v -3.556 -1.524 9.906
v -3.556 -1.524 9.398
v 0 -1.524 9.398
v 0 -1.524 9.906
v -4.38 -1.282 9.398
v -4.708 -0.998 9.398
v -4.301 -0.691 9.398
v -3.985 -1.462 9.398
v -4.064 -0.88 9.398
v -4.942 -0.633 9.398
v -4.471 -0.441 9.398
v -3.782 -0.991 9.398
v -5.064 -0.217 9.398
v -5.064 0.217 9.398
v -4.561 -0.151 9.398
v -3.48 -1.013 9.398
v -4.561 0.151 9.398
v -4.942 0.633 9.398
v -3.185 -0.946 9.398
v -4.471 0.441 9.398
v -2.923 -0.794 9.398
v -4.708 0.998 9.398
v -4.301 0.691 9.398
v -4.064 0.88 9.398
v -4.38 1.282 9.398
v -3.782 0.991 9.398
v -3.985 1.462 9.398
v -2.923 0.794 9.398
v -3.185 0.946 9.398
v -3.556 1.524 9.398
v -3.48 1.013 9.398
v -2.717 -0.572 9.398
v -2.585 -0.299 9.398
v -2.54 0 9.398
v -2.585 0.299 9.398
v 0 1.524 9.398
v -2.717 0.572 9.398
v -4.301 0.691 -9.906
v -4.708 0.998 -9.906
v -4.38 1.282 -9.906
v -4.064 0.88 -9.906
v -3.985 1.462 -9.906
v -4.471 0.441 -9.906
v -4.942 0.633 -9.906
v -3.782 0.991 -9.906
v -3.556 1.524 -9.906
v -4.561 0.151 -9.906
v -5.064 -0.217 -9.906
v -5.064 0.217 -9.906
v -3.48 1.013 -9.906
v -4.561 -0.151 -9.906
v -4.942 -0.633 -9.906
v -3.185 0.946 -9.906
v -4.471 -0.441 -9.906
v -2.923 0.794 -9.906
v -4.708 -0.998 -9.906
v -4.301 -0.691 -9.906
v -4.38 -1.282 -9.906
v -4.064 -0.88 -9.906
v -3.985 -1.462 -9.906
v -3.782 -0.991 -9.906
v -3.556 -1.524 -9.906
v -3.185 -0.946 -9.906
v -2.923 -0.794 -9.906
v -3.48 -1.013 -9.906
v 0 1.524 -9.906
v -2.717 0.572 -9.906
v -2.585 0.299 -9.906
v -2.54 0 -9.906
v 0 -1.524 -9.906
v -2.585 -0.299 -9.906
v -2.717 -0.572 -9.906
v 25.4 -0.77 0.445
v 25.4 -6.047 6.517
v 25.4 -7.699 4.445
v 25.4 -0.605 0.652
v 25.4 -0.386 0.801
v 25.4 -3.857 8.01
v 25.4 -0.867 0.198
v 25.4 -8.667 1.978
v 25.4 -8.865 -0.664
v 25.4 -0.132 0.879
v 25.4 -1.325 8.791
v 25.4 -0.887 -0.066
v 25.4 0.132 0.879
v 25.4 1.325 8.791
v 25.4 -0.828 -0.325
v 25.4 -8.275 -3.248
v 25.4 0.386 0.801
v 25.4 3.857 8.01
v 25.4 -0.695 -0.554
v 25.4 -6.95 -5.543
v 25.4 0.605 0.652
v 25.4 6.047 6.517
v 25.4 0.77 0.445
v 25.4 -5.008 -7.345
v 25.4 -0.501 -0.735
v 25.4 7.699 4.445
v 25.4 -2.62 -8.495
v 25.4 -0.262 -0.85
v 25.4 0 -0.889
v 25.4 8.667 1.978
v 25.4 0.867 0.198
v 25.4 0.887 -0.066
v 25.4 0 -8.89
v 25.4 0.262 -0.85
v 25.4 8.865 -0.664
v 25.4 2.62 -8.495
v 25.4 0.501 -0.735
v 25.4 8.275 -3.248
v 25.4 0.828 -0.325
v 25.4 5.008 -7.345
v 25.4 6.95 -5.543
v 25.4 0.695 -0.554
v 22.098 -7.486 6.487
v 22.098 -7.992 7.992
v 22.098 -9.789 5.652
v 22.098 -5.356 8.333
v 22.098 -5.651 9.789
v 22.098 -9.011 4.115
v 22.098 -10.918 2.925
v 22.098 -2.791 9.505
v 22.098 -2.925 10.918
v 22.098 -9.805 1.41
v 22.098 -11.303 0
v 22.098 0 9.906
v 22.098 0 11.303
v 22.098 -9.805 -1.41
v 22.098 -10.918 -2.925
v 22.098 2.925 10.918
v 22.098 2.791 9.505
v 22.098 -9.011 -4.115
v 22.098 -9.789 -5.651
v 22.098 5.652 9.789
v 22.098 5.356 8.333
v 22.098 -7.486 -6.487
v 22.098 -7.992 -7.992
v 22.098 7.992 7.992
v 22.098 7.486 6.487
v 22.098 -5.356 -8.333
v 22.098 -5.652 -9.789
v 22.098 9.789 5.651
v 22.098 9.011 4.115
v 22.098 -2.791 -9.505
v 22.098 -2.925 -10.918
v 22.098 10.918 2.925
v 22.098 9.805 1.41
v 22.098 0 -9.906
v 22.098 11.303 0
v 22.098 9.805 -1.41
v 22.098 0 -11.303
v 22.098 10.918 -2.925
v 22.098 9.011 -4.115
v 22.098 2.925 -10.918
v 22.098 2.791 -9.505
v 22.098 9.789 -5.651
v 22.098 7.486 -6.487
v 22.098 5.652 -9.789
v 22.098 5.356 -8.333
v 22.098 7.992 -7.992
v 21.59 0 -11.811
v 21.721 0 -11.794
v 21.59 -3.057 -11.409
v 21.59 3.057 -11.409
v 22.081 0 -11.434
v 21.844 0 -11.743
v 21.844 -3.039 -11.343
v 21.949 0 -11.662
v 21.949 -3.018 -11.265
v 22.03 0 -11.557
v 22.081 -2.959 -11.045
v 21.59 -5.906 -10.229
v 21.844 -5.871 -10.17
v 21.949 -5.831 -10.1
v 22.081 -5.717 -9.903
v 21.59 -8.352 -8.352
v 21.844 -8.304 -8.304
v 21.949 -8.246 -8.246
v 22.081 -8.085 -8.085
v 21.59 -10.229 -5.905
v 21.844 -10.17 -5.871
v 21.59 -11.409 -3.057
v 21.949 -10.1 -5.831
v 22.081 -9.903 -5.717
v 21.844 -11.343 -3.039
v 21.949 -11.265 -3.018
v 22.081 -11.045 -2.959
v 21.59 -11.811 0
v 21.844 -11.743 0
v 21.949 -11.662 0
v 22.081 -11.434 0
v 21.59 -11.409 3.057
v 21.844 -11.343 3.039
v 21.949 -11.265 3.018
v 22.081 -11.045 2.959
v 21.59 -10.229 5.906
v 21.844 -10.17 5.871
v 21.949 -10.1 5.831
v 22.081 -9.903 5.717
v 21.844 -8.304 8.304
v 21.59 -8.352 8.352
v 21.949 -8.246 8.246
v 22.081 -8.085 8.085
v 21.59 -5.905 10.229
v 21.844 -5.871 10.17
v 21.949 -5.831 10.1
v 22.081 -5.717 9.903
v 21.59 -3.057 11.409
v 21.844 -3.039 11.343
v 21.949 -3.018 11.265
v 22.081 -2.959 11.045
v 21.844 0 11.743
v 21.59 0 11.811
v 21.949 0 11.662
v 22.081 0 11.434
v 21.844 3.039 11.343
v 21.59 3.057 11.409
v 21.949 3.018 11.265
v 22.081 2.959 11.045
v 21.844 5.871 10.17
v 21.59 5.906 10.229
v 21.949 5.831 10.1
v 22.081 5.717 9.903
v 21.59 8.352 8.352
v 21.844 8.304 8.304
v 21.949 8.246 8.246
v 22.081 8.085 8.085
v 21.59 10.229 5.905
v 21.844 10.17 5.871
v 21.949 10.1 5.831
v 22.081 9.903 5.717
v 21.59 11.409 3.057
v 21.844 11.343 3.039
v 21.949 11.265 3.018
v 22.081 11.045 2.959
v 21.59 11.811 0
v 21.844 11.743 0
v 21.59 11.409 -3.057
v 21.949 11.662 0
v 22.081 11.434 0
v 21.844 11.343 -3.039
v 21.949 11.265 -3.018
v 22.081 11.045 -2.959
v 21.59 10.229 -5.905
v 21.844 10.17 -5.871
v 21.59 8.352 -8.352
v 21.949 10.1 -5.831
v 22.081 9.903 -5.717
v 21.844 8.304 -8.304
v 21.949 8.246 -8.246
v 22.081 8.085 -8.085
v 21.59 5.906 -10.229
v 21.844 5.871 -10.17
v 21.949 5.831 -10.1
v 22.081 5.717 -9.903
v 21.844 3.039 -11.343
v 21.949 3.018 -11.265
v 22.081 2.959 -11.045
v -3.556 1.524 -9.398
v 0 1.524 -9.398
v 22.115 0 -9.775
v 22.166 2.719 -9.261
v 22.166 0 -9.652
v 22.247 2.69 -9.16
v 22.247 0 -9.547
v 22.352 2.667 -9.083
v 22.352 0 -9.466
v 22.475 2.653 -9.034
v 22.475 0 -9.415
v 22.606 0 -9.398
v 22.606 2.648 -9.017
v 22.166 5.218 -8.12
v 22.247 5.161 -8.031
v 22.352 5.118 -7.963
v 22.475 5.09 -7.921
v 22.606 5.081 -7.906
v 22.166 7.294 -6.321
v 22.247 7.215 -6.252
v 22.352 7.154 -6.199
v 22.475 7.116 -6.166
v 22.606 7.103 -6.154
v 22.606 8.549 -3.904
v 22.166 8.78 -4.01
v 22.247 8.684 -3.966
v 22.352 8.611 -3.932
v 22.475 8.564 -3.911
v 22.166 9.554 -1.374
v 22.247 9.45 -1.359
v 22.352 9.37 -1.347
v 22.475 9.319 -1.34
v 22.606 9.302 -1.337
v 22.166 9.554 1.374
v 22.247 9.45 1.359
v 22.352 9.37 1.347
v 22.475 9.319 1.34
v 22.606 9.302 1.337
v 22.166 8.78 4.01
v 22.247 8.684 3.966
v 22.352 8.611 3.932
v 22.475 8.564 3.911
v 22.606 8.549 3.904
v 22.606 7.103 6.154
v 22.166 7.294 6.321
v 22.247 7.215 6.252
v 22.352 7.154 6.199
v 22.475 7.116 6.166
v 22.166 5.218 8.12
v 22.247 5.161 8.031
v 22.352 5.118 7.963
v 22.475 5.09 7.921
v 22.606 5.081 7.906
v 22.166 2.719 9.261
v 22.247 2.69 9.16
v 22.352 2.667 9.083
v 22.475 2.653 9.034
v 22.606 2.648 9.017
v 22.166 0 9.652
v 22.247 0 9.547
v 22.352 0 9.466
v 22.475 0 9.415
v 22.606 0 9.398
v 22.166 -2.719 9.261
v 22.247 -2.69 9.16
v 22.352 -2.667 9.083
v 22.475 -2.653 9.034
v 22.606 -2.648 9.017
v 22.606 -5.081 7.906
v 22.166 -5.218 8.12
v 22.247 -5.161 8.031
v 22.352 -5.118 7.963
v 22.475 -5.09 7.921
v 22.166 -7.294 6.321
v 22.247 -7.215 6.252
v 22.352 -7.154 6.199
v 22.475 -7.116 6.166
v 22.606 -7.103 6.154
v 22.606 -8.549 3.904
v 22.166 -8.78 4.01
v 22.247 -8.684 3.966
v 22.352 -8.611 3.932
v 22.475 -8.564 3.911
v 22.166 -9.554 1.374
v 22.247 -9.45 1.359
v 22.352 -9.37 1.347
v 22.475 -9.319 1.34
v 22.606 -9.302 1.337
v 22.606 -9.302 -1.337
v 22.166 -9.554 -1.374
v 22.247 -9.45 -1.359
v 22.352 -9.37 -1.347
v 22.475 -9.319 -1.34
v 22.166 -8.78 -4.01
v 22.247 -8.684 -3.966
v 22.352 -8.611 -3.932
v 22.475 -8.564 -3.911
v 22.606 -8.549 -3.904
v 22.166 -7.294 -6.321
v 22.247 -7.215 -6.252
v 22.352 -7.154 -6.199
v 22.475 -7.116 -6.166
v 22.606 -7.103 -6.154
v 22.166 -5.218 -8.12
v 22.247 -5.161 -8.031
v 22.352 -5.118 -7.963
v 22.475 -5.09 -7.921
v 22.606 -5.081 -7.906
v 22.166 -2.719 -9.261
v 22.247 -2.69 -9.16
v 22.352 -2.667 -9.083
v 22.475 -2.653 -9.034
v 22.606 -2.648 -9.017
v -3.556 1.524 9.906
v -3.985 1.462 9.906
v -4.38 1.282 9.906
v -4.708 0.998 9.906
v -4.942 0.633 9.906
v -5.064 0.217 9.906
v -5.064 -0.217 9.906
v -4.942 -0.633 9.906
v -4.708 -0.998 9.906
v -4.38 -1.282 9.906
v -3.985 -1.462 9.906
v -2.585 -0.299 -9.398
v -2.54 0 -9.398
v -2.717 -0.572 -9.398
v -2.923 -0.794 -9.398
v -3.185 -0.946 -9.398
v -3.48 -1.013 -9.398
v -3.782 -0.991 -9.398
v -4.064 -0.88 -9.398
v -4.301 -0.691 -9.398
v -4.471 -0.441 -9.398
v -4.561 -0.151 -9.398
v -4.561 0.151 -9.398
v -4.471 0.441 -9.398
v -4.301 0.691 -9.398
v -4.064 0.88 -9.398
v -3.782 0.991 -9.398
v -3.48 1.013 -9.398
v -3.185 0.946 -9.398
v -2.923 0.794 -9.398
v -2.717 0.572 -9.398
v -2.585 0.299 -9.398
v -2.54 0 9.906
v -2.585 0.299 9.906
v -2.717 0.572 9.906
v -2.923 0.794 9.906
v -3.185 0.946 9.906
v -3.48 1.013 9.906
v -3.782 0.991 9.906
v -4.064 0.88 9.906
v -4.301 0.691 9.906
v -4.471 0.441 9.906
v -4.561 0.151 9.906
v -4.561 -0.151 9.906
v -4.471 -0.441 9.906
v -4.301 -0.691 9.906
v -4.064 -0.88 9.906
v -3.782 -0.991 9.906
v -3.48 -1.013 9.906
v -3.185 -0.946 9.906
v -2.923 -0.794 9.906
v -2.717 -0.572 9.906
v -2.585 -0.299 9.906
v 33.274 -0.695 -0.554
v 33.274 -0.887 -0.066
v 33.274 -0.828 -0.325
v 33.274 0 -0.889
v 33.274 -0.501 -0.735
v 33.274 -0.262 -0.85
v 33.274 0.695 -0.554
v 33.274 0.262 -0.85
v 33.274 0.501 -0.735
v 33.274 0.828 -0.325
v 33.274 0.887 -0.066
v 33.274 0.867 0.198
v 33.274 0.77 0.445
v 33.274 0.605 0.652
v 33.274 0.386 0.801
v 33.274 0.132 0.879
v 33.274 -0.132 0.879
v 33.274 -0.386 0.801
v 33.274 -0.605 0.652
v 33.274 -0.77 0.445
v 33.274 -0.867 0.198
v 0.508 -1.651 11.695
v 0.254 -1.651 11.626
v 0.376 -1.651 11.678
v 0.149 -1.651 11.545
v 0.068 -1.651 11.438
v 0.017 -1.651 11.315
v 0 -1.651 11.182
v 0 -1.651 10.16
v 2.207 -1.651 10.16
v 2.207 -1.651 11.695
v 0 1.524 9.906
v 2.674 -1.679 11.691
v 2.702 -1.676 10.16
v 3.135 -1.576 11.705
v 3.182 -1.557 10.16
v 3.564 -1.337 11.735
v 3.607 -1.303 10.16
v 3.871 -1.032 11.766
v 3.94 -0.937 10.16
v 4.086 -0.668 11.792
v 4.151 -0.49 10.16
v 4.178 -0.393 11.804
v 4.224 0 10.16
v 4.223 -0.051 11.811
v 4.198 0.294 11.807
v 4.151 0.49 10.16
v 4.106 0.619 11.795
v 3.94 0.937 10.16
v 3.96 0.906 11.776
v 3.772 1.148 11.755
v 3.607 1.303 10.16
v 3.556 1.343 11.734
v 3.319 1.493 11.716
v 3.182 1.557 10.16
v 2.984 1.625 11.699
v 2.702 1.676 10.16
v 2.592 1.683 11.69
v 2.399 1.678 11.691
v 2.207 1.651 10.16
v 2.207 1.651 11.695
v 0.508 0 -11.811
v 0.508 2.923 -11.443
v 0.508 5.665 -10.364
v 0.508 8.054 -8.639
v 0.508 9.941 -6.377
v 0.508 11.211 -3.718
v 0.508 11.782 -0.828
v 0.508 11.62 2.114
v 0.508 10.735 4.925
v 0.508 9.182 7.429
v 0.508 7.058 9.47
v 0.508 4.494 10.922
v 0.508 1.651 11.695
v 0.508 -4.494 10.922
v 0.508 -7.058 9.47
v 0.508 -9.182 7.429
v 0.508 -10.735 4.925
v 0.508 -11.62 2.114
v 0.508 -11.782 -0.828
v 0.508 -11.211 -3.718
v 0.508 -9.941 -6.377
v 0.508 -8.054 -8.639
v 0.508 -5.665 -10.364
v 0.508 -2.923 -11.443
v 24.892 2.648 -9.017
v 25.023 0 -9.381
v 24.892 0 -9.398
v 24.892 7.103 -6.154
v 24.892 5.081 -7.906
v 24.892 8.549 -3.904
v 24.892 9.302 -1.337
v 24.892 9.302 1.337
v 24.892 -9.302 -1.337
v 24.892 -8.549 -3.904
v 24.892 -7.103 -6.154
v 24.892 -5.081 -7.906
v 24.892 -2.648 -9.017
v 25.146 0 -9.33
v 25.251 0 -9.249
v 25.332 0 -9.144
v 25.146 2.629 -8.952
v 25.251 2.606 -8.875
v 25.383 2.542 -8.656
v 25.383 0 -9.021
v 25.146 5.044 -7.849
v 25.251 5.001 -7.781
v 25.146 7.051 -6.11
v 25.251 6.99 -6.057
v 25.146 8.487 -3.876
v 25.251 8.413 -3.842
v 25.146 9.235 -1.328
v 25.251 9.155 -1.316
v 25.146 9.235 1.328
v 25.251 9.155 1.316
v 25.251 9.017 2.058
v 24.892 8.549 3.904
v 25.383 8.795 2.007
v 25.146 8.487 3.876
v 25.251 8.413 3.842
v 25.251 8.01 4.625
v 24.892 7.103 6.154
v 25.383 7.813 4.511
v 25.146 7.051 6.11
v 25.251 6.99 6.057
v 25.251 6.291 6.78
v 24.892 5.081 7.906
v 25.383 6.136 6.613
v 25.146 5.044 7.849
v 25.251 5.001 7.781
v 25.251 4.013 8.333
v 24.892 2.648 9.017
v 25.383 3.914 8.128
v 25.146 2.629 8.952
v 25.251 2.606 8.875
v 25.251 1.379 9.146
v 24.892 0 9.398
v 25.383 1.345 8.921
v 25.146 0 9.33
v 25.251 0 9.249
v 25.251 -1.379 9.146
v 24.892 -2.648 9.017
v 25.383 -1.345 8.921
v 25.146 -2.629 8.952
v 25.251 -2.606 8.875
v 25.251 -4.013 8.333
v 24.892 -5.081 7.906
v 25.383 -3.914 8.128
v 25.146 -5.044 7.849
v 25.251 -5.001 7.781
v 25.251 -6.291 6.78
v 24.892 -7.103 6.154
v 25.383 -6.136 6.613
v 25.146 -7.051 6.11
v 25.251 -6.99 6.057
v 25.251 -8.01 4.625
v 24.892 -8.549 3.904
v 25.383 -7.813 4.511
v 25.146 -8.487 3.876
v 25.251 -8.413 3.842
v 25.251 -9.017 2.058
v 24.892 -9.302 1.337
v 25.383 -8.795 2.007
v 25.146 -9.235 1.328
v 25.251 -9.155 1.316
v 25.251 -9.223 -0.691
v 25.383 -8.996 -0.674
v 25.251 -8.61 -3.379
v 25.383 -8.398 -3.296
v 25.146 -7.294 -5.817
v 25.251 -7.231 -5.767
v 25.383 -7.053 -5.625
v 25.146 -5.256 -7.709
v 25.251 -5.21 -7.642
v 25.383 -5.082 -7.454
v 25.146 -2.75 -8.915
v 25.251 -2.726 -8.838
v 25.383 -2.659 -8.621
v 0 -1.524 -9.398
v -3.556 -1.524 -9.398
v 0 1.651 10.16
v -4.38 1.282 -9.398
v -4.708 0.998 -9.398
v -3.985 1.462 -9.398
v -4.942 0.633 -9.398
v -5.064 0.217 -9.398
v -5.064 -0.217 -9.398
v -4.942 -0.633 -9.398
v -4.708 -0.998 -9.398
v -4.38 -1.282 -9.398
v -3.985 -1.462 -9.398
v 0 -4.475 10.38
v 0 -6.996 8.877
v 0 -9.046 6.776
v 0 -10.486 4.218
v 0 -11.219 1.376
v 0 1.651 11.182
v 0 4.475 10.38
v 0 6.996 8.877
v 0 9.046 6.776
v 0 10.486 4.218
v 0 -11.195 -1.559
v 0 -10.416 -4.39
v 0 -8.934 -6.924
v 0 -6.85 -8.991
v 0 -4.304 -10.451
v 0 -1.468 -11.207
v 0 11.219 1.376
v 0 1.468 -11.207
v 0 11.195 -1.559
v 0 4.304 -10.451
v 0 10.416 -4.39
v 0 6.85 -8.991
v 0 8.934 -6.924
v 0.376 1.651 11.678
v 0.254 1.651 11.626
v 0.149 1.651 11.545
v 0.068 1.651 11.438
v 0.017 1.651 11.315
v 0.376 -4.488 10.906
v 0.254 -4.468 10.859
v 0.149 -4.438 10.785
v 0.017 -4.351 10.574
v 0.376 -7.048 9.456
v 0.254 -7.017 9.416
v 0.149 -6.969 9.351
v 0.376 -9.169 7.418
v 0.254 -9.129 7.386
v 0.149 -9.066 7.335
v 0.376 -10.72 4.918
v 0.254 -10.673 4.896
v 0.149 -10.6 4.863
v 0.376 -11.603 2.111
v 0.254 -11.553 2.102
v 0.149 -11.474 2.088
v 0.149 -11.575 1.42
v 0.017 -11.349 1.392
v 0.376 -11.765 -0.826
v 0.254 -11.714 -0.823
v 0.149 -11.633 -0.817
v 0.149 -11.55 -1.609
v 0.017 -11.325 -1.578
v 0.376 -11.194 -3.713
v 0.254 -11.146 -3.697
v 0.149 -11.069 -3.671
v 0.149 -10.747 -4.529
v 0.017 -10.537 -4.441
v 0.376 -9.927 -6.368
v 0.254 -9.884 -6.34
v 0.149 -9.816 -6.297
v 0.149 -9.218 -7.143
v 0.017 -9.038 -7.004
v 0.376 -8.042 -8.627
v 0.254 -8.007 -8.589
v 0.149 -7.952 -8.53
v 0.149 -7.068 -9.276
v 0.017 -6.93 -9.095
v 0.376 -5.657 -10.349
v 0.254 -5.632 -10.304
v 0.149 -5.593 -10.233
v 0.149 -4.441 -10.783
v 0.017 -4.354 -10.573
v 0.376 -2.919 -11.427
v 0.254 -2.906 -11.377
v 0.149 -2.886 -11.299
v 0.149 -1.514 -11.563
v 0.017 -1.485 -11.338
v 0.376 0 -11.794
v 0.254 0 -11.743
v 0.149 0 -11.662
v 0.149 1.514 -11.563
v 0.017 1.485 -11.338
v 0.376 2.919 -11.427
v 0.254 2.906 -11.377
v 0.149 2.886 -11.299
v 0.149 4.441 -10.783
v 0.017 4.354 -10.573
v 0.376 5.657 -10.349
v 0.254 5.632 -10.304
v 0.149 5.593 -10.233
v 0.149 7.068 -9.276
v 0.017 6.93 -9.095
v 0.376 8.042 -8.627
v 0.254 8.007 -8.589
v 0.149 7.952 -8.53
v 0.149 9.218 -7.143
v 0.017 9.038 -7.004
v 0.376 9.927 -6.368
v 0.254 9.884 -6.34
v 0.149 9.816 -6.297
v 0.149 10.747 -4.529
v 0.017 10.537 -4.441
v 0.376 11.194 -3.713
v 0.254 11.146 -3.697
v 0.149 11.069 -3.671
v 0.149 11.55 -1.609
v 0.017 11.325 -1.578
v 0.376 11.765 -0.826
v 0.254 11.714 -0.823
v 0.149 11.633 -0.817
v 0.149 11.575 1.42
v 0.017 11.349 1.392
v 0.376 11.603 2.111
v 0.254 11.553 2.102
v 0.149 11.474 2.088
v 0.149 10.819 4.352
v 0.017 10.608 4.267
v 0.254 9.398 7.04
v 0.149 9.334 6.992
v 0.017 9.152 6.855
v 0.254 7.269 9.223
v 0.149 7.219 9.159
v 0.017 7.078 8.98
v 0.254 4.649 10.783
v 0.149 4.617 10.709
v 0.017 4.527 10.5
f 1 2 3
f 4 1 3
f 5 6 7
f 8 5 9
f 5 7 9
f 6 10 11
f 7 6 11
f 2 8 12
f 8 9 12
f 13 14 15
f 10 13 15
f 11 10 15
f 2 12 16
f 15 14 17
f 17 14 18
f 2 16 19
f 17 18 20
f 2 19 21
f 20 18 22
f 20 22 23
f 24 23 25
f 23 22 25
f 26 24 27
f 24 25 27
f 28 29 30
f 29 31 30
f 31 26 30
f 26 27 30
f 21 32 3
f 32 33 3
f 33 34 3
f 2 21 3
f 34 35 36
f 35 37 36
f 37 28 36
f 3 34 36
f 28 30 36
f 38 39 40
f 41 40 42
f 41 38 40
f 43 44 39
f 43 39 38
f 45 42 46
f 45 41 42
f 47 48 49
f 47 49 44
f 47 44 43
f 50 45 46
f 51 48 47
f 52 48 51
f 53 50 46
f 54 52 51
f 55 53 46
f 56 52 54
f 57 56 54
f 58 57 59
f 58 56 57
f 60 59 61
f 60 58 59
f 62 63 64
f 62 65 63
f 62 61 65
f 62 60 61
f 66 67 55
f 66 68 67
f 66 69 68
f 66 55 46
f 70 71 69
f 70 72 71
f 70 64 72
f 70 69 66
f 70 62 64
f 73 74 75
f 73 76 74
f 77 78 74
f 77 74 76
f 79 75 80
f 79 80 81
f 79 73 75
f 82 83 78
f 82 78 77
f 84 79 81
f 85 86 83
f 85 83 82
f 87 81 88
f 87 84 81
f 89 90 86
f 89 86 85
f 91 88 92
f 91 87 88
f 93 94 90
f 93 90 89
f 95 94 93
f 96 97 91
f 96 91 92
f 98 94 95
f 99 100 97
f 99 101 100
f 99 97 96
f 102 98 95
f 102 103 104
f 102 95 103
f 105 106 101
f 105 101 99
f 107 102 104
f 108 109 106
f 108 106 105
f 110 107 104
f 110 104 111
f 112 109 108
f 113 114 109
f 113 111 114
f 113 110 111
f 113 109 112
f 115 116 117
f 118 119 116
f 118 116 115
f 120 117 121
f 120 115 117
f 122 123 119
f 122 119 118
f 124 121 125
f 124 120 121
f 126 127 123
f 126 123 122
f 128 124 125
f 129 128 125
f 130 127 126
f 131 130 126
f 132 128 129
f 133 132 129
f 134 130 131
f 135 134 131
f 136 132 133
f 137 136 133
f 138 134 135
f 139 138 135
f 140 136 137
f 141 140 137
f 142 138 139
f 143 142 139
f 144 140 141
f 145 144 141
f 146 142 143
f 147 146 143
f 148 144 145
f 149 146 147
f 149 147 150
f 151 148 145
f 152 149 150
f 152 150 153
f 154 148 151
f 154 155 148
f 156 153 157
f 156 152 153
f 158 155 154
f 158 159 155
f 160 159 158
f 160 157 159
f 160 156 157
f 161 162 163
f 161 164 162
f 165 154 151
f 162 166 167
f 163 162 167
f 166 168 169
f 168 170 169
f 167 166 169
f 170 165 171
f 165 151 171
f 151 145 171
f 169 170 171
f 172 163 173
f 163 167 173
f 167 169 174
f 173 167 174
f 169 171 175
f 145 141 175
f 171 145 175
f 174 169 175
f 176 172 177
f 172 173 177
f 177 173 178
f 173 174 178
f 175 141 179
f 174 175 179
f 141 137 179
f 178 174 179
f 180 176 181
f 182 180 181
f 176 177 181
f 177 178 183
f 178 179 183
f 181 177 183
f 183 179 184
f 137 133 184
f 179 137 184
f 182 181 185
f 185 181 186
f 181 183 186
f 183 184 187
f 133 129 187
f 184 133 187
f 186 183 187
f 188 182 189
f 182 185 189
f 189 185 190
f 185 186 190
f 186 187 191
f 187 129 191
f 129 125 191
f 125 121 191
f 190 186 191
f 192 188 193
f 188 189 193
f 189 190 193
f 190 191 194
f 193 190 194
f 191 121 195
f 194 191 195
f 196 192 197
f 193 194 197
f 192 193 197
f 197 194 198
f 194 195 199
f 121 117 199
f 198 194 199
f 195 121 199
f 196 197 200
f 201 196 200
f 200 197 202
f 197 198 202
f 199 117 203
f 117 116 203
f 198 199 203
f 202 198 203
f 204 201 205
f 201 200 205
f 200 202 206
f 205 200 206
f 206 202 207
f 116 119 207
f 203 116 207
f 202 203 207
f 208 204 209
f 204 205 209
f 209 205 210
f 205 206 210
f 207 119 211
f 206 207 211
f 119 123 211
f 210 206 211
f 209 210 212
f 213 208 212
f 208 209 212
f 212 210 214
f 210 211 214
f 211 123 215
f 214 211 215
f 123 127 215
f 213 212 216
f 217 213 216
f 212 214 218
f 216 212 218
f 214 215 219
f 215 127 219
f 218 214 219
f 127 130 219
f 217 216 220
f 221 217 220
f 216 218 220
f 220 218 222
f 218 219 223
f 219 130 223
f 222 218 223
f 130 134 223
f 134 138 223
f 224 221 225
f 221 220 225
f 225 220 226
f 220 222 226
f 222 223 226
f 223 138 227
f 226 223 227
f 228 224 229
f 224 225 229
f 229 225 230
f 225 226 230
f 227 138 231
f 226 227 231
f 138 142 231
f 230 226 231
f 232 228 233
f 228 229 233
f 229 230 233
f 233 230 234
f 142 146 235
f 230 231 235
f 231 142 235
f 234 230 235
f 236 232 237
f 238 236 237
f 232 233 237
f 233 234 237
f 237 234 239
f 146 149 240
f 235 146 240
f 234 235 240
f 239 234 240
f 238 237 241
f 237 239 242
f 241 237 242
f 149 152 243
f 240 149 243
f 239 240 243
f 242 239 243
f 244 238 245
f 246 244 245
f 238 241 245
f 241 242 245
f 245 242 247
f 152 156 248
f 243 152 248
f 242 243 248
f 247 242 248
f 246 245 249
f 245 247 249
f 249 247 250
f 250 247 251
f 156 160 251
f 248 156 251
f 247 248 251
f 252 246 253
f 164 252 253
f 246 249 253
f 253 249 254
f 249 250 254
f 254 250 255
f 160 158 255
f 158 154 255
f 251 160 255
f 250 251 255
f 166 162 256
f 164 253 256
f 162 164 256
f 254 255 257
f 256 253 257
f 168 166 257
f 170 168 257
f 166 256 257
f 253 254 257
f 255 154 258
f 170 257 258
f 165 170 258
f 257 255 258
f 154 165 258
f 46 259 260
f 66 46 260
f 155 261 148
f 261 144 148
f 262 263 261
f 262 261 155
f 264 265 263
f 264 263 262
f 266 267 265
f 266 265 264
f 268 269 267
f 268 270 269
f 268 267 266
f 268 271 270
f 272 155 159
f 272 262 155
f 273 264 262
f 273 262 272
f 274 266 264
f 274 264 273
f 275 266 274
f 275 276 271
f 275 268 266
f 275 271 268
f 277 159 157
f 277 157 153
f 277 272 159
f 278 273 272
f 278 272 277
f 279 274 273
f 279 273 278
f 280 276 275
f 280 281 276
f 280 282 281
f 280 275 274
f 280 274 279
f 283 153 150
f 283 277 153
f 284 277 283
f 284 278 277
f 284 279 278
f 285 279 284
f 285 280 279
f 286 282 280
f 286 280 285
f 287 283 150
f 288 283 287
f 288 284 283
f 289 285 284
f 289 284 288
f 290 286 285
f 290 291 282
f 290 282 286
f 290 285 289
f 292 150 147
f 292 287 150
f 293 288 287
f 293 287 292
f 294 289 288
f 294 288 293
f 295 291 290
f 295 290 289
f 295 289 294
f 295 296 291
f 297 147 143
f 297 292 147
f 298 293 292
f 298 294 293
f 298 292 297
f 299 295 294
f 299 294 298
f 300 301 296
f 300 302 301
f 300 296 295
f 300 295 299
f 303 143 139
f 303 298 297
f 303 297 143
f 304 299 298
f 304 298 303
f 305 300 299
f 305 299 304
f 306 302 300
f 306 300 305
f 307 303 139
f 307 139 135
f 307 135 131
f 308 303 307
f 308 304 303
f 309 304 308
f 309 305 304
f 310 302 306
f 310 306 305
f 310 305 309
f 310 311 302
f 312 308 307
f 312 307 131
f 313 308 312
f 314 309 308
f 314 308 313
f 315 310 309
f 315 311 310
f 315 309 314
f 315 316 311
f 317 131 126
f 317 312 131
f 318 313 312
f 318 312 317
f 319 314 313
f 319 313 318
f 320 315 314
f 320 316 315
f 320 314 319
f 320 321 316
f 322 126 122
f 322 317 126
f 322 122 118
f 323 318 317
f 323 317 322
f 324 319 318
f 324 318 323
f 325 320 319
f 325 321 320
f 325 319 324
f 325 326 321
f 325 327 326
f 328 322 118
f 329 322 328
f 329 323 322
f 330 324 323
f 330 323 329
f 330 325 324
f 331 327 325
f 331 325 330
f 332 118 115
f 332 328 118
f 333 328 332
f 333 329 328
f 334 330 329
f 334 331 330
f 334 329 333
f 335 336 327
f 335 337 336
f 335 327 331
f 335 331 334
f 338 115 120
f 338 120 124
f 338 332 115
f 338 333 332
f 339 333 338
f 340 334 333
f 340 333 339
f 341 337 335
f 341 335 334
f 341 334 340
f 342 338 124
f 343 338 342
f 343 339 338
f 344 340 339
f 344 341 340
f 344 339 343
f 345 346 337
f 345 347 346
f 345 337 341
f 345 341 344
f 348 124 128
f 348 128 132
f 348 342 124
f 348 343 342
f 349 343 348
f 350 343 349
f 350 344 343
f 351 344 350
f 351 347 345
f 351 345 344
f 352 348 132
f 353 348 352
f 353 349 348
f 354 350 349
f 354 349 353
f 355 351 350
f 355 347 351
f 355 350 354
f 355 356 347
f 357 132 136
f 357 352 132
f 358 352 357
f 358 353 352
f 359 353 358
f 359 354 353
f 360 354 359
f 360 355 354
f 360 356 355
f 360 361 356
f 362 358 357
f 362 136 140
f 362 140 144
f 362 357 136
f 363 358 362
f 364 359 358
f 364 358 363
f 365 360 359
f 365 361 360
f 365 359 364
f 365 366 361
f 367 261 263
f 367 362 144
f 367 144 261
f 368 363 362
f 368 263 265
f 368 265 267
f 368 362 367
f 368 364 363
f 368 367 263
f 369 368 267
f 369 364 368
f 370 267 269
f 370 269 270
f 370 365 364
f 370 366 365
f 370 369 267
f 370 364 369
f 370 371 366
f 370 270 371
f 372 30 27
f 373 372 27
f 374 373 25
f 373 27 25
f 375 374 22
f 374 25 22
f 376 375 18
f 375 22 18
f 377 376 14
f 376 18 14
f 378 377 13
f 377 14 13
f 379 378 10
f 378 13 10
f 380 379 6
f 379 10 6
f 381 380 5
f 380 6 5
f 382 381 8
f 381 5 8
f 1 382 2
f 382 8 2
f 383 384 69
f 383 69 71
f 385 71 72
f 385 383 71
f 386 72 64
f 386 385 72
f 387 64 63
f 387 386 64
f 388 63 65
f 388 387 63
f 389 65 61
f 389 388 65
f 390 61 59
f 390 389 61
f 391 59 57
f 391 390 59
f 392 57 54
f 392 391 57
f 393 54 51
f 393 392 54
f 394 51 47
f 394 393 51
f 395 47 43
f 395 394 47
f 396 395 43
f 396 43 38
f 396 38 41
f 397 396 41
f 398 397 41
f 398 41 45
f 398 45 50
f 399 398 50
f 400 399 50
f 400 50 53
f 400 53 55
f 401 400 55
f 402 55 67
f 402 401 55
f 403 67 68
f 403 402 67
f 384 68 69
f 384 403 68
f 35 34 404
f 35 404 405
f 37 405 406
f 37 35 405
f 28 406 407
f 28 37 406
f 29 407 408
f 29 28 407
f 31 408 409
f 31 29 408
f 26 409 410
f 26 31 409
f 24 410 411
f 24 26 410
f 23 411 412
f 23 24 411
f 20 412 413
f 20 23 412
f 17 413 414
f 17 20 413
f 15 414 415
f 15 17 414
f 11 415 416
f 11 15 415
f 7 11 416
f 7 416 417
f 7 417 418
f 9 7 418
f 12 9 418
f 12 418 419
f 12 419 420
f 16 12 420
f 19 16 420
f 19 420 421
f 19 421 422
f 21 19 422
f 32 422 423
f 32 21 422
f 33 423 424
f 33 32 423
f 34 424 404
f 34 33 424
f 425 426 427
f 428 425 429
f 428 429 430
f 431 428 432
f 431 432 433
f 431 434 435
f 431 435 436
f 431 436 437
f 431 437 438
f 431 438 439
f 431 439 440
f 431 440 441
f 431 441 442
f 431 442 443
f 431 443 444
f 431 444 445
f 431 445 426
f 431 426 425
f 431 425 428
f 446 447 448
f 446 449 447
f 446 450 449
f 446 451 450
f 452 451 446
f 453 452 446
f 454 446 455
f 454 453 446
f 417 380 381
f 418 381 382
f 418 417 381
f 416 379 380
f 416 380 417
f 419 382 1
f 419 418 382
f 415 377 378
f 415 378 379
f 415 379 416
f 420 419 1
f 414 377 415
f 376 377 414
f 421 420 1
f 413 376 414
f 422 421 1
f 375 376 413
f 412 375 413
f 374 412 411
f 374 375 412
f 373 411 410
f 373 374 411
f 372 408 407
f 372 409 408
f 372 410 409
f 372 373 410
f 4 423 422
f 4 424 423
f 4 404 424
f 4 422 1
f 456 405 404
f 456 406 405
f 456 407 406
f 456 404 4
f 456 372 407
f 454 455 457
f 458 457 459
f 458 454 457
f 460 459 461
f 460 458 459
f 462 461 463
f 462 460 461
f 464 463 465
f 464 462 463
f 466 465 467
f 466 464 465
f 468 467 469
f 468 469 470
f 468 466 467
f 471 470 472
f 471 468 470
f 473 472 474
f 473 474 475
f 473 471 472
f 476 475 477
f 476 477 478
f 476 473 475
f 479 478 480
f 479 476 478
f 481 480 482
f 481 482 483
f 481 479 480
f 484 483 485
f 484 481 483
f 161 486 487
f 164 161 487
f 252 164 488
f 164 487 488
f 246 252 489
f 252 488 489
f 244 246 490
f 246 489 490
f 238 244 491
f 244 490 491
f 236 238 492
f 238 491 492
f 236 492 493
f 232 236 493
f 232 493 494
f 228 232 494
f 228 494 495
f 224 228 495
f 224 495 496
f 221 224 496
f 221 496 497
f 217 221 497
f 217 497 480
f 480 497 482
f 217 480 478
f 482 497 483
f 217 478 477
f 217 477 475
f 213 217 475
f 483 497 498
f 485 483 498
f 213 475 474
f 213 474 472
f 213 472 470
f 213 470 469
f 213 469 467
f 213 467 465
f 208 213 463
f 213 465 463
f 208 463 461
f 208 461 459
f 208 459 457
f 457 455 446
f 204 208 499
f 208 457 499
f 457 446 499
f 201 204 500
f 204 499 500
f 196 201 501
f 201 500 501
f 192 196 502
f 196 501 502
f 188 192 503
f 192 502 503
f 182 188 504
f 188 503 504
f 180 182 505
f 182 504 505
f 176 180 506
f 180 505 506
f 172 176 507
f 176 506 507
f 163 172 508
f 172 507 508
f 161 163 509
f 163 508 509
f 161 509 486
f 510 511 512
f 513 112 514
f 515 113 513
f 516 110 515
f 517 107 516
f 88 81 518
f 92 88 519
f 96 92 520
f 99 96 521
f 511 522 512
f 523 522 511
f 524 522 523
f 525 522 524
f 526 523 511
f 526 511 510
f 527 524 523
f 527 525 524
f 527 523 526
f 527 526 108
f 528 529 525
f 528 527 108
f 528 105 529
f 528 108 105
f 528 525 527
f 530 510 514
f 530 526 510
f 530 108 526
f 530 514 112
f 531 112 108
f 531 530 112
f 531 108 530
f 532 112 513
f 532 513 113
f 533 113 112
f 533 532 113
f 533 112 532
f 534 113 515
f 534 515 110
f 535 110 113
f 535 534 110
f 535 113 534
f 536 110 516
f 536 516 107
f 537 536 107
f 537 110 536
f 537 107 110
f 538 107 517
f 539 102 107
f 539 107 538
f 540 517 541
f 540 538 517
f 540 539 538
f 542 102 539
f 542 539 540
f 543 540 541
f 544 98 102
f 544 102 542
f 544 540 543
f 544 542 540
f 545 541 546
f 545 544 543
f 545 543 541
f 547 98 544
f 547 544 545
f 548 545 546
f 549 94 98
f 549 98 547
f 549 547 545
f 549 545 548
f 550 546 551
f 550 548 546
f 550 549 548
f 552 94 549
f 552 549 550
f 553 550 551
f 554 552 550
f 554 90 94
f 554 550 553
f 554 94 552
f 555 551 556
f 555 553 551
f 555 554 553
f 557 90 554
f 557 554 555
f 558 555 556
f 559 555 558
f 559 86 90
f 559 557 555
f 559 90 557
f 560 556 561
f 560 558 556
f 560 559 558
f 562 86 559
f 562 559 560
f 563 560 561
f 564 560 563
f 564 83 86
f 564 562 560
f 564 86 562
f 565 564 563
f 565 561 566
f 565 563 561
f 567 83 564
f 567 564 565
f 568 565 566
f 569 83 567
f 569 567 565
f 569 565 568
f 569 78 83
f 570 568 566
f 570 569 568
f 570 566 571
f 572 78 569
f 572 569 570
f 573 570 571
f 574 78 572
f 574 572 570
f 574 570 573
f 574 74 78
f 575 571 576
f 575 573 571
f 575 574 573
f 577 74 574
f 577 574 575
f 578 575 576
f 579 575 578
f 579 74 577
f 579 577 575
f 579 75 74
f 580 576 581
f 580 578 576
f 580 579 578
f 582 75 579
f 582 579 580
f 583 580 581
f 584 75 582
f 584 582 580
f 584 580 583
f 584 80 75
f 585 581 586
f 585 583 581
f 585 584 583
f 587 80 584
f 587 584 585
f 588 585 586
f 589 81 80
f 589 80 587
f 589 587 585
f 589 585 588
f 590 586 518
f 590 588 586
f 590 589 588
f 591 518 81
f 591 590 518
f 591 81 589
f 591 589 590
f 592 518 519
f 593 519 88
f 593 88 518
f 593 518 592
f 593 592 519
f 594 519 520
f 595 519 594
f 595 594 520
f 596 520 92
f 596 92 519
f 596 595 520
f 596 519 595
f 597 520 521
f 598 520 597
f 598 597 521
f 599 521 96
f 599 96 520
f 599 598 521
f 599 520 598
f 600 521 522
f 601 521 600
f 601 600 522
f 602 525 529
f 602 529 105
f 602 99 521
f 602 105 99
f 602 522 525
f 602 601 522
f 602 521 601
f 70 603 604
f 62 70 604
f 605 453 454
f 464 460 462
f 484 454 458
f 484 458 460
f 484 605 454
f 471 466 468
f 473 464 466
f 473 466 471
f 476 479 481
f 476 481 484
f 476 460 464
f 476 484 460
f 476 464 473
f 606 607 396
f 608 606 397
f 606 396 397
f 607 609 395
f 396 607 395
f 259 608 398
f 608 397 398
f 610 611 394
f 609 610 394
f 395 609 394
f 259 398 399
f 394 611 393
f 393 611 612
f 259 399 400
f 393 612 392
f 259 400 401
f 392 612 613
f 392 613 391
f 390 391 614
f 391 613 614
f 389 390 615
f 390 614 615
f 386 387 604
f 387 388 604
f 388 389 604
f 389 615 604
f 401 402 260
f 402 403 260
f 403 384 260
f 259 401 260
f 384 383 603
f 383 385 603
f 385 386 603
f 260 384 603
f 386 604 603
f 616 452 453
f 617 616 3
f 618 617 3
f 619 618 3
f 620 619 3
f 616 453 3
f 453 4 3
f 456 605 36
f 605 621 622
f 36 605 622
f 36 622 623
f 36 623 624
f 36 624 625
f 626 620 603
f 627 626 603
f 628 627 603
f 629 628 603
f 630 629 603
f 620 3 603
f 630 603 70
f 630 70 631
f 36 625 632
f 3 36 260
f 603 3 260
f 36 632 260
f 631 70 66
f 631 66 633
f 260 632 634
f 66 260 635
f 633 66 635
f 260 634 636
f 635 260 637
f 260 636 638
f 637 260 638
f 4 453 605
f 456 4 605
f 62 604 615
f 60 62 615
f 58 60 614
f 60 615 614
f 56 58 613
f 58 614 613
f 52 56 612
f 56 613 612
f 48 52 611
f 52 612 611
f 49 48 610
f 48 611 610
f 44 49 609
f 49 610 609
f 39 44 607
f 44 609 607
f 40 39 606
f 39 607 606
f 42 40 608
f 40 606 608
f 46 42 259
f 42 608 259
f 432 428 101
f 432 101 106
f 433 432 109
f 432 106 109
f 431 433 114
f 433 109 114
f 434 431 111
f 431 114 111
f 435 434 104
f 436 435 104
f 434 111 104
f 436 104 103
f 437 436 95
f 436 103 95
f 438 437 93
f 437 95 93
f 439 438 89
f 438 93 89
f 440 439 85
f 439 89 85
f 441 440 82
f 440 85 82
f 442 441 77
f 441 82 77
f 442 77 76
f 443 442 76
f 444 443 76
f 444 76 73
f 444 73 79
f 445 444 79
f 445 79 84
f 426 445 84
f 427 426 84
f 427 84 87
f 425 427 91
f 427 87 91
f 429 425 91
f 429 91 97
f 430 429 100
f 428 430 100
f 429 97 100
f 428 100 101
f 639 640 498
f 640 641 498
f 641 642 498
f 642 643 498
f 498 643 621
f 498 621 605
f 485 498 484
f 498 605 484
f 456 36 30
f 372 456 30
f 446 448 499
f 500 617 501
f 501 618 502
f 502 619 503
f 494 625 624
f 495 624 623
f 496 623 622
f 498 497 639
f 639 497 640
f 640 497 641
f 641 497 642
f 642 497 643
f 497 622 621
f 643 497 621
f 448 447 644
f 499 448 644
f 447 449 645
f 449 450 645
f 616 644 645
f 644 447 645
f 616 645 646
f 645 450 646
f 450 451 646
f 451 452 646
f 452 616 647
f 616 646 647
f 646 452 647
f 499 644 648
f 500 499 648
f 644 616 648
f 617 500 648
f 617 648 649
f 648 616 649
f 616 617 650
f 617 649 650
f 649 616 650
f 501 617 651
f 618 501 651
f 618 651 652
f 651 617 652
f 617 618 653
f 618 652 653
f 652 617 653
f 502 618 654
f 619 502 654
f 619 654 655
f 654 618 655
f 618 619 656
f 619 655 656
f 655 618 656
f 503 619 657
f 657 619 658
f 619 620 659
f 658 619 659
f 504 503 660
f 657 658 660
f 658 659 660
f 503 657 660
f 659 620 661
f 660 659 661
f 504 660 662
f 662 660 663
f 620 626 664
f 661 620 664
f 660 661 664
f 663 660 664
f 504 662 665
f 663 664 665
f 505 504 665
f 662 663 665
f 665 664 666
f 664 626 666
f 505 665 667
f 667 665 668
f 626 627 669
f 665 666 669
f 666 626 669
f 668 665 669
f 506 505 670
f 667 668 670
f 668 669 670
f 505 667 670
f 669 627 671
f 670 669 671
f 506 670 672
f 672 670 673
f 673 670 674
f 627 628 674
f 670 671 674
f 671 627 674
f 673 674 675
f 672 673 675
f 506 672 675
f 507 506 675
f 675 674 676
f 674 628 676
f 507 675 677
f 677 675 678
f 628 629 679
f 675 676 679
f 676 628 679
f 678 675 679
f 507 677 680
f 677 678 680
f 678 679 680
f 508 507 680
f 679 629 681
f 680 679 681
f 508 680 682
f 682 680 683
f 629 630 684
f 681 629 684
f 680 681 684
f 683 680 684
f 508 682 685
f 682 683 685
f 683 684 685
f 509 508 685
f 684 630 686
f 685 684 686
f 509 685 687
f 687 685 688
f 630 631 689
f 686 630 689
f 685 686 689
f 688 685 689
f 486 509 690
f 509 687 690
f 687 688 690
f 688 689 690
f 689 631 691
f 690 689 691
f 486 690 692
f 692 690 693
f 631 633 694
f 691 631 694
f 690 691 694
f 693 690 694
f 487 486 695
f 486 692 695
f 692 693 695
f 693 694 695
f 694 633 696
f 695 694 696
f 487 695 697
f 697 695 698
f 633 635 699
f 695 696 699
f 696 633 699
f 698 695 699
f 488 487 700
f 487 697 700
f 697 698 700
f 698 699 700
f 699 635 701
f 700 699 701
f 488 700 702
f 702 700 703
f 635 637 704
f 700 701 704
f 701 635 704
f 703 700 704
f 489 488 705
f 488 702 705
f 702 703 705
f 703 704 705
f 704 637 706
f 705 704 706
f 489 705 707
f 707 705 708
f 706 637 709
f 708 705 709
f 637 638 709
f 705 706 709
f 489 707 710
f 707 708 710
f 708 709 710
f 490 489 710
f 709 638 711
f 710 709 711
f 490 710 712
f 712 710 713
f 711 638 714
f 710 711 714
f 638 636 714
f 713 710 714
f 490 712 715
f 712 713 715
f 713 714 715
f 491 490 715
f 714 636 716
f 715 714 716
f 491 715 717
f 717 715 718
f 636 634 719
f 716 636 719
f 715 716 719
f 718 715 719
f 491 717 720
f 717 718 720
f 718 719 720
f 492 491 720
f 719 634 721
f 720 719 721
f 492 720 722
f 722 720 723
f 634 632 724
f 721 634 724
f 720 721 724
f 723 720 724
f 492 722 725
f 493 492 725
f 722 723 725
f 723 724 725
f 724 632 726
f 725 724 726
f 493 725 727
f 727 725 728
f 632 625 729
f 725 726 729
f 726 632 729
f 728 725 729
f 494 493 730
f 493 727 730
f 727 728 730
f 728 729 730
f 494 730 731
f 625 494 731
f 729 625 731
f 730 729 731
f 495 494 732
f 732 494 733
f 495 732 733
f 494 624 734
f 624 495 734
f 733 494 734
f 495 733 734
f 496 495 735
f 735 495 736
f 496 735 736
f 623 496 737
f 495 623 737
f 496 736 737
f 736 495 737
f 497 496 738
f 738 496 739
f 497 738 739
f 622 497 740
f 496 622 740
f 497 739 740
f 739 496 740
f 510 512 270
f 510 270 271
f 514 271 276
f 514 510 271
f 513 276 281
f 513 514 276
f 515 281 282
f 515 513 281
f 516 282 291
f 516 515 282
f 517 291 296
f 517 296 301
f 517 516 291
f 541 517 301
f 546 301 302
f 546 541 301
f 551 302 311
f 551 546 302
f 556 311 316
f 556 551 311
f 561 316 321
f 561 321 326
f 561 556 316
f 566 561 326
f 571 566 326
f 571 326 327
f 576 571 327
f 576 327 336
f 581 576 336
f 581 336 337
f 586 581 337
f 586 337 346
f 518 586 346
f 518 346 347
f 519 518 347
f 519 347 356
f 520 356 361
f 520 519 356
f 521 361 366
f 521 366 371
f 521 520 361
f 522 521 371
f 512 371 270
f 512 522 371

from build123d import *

# Parameters (mm, degrees)
SKETCH2_R           = 11.811
BOSS_EXTRUDE1_DEPTH = 25.4
SKETCH4_OUTSIDE_W   = 34.016
SKETCH4_OUTSIDE_H   = 34.016
SKETCH4_OUTSIDE_R   = 9.398
CUT_EXTRUDE1_DEPTH  = 3.302
FILLET1_R           = 0.508
SKETCH5_R           = 0.889
BOSS_EXTRUDE2_DEPTH = 7.874
CUT_EXTRUDE2_START  = 10.16
SKETCH8_R           = 1.684208496
SKETCH8_W           = 2.54
SKETCH8_H           = 3.302
CUT_EXTRUDE2_DEPTH  = 28.071149866
BOSS_EXTRUDE3_START = 9.398
SKETCH10_R          = 1.016
BOSS_EXTRUDE3_DEPTH = 0.508
CIRPATTERN1_COUNT   = 2


with BuildPart() as part:
    # Sketch2 → Boss-Extrude1 (new body)
    with BuildSketch(Plane(origin=(0, 0, 0), x_dir=(0, 0, -1), z_dir=(1, 0, 0))):
        Circle(SKETCH2_R)
    extrude(amount=BOSS_EXTRUDE1_DEPTH)

    # Sketch4 outside → Cut-Extrude1 (cut)
    with BuildSketch(Plane(origin=(25.4, 0, 0), x_dir=(0, 0, -1), z_dir=(1, 0, 0))):
        Rectangle(SKETCH4_OUTSIDE_W, SKETCH4_OUTSIDE_H)
        Circle(SKETCH4_OUTSIDE_R, mode=Mode.SUBTRACT)
    extrude(amount=-CUT_EXTRUDE1_DEPTH, mode=Mode.SUBTRACT)

    # Fillet1
    fillet1_edges = [part.edges().sort_by_distance(p)[0] for p in [
        (22.098, 0, 11.811),
        (25.4, 0, 9.398),
        (0, 0, 11.811),
        (22.098, 0, 9.398),
    ]]
    fillet(fillet1_edges, radius=FILLET1_R)

    # Sketch5 → Boss-Extrude2 (add)
    with BuildSketch(Plane(origin=(25.4, 0, 0), x_dir=(0, 0, -1), z_dir=(1, 0, 0))):
        Circle(SKETCH5_R)
    extrude(amount=BOSS_EXTRUDE2_DEPTH)

    # Sketch8 → Cut-Extrude2 (cut, through all)
    with BuildSketch(Plane.XY.offset(CUT_EXTRUDE2_START)):
        with Locations((2.54, 0)):
            Circle(SKETCH8_R)
        with Locations((1.27, 0)):
            Rectangle(SKETCH8_W, SKETCH8_H)
    extrude(amount=CUT_EXTRUDE2_DEPTH, mode=Mode.SUBTRACT)

    # Sketch10 → Boss-Extrude3 (add)
    with BuildSketch(Plane.XY.offset(BOSS_EXTRUDE3_START)):
        with BuildLine():
            Line((-3.556, -1.524), (0, -1.524))
            Line((0, -1.524), (0, 1.524))
            Line((0, 1.524), (-3.556, 1.524))
            ThreePointArc((-3.556, 1.524), (-5.08, 0), (-3.556, -1.524))
        make_face()
        with Locations((-3.556, 0)):
            Circle(SKETCH10_R, mode=Mode.SUBTRACT)
    boss_extrude3 = extrude(amount=BOSS_EXTRUDE3_DEPTH)

    # CirPattern1: Boss-Extrude3 ×2 about axis
    cirpattern1_axis = Axis((0, 0, 0), (1, 0, 0))
    for i in range(1, CIRPATTERN1_COUNT):
        add(boss_extrude3.rotate(cirpattern1_axis, i * 360 / CIRPATTERN1_COUNT))


solid = part.part
